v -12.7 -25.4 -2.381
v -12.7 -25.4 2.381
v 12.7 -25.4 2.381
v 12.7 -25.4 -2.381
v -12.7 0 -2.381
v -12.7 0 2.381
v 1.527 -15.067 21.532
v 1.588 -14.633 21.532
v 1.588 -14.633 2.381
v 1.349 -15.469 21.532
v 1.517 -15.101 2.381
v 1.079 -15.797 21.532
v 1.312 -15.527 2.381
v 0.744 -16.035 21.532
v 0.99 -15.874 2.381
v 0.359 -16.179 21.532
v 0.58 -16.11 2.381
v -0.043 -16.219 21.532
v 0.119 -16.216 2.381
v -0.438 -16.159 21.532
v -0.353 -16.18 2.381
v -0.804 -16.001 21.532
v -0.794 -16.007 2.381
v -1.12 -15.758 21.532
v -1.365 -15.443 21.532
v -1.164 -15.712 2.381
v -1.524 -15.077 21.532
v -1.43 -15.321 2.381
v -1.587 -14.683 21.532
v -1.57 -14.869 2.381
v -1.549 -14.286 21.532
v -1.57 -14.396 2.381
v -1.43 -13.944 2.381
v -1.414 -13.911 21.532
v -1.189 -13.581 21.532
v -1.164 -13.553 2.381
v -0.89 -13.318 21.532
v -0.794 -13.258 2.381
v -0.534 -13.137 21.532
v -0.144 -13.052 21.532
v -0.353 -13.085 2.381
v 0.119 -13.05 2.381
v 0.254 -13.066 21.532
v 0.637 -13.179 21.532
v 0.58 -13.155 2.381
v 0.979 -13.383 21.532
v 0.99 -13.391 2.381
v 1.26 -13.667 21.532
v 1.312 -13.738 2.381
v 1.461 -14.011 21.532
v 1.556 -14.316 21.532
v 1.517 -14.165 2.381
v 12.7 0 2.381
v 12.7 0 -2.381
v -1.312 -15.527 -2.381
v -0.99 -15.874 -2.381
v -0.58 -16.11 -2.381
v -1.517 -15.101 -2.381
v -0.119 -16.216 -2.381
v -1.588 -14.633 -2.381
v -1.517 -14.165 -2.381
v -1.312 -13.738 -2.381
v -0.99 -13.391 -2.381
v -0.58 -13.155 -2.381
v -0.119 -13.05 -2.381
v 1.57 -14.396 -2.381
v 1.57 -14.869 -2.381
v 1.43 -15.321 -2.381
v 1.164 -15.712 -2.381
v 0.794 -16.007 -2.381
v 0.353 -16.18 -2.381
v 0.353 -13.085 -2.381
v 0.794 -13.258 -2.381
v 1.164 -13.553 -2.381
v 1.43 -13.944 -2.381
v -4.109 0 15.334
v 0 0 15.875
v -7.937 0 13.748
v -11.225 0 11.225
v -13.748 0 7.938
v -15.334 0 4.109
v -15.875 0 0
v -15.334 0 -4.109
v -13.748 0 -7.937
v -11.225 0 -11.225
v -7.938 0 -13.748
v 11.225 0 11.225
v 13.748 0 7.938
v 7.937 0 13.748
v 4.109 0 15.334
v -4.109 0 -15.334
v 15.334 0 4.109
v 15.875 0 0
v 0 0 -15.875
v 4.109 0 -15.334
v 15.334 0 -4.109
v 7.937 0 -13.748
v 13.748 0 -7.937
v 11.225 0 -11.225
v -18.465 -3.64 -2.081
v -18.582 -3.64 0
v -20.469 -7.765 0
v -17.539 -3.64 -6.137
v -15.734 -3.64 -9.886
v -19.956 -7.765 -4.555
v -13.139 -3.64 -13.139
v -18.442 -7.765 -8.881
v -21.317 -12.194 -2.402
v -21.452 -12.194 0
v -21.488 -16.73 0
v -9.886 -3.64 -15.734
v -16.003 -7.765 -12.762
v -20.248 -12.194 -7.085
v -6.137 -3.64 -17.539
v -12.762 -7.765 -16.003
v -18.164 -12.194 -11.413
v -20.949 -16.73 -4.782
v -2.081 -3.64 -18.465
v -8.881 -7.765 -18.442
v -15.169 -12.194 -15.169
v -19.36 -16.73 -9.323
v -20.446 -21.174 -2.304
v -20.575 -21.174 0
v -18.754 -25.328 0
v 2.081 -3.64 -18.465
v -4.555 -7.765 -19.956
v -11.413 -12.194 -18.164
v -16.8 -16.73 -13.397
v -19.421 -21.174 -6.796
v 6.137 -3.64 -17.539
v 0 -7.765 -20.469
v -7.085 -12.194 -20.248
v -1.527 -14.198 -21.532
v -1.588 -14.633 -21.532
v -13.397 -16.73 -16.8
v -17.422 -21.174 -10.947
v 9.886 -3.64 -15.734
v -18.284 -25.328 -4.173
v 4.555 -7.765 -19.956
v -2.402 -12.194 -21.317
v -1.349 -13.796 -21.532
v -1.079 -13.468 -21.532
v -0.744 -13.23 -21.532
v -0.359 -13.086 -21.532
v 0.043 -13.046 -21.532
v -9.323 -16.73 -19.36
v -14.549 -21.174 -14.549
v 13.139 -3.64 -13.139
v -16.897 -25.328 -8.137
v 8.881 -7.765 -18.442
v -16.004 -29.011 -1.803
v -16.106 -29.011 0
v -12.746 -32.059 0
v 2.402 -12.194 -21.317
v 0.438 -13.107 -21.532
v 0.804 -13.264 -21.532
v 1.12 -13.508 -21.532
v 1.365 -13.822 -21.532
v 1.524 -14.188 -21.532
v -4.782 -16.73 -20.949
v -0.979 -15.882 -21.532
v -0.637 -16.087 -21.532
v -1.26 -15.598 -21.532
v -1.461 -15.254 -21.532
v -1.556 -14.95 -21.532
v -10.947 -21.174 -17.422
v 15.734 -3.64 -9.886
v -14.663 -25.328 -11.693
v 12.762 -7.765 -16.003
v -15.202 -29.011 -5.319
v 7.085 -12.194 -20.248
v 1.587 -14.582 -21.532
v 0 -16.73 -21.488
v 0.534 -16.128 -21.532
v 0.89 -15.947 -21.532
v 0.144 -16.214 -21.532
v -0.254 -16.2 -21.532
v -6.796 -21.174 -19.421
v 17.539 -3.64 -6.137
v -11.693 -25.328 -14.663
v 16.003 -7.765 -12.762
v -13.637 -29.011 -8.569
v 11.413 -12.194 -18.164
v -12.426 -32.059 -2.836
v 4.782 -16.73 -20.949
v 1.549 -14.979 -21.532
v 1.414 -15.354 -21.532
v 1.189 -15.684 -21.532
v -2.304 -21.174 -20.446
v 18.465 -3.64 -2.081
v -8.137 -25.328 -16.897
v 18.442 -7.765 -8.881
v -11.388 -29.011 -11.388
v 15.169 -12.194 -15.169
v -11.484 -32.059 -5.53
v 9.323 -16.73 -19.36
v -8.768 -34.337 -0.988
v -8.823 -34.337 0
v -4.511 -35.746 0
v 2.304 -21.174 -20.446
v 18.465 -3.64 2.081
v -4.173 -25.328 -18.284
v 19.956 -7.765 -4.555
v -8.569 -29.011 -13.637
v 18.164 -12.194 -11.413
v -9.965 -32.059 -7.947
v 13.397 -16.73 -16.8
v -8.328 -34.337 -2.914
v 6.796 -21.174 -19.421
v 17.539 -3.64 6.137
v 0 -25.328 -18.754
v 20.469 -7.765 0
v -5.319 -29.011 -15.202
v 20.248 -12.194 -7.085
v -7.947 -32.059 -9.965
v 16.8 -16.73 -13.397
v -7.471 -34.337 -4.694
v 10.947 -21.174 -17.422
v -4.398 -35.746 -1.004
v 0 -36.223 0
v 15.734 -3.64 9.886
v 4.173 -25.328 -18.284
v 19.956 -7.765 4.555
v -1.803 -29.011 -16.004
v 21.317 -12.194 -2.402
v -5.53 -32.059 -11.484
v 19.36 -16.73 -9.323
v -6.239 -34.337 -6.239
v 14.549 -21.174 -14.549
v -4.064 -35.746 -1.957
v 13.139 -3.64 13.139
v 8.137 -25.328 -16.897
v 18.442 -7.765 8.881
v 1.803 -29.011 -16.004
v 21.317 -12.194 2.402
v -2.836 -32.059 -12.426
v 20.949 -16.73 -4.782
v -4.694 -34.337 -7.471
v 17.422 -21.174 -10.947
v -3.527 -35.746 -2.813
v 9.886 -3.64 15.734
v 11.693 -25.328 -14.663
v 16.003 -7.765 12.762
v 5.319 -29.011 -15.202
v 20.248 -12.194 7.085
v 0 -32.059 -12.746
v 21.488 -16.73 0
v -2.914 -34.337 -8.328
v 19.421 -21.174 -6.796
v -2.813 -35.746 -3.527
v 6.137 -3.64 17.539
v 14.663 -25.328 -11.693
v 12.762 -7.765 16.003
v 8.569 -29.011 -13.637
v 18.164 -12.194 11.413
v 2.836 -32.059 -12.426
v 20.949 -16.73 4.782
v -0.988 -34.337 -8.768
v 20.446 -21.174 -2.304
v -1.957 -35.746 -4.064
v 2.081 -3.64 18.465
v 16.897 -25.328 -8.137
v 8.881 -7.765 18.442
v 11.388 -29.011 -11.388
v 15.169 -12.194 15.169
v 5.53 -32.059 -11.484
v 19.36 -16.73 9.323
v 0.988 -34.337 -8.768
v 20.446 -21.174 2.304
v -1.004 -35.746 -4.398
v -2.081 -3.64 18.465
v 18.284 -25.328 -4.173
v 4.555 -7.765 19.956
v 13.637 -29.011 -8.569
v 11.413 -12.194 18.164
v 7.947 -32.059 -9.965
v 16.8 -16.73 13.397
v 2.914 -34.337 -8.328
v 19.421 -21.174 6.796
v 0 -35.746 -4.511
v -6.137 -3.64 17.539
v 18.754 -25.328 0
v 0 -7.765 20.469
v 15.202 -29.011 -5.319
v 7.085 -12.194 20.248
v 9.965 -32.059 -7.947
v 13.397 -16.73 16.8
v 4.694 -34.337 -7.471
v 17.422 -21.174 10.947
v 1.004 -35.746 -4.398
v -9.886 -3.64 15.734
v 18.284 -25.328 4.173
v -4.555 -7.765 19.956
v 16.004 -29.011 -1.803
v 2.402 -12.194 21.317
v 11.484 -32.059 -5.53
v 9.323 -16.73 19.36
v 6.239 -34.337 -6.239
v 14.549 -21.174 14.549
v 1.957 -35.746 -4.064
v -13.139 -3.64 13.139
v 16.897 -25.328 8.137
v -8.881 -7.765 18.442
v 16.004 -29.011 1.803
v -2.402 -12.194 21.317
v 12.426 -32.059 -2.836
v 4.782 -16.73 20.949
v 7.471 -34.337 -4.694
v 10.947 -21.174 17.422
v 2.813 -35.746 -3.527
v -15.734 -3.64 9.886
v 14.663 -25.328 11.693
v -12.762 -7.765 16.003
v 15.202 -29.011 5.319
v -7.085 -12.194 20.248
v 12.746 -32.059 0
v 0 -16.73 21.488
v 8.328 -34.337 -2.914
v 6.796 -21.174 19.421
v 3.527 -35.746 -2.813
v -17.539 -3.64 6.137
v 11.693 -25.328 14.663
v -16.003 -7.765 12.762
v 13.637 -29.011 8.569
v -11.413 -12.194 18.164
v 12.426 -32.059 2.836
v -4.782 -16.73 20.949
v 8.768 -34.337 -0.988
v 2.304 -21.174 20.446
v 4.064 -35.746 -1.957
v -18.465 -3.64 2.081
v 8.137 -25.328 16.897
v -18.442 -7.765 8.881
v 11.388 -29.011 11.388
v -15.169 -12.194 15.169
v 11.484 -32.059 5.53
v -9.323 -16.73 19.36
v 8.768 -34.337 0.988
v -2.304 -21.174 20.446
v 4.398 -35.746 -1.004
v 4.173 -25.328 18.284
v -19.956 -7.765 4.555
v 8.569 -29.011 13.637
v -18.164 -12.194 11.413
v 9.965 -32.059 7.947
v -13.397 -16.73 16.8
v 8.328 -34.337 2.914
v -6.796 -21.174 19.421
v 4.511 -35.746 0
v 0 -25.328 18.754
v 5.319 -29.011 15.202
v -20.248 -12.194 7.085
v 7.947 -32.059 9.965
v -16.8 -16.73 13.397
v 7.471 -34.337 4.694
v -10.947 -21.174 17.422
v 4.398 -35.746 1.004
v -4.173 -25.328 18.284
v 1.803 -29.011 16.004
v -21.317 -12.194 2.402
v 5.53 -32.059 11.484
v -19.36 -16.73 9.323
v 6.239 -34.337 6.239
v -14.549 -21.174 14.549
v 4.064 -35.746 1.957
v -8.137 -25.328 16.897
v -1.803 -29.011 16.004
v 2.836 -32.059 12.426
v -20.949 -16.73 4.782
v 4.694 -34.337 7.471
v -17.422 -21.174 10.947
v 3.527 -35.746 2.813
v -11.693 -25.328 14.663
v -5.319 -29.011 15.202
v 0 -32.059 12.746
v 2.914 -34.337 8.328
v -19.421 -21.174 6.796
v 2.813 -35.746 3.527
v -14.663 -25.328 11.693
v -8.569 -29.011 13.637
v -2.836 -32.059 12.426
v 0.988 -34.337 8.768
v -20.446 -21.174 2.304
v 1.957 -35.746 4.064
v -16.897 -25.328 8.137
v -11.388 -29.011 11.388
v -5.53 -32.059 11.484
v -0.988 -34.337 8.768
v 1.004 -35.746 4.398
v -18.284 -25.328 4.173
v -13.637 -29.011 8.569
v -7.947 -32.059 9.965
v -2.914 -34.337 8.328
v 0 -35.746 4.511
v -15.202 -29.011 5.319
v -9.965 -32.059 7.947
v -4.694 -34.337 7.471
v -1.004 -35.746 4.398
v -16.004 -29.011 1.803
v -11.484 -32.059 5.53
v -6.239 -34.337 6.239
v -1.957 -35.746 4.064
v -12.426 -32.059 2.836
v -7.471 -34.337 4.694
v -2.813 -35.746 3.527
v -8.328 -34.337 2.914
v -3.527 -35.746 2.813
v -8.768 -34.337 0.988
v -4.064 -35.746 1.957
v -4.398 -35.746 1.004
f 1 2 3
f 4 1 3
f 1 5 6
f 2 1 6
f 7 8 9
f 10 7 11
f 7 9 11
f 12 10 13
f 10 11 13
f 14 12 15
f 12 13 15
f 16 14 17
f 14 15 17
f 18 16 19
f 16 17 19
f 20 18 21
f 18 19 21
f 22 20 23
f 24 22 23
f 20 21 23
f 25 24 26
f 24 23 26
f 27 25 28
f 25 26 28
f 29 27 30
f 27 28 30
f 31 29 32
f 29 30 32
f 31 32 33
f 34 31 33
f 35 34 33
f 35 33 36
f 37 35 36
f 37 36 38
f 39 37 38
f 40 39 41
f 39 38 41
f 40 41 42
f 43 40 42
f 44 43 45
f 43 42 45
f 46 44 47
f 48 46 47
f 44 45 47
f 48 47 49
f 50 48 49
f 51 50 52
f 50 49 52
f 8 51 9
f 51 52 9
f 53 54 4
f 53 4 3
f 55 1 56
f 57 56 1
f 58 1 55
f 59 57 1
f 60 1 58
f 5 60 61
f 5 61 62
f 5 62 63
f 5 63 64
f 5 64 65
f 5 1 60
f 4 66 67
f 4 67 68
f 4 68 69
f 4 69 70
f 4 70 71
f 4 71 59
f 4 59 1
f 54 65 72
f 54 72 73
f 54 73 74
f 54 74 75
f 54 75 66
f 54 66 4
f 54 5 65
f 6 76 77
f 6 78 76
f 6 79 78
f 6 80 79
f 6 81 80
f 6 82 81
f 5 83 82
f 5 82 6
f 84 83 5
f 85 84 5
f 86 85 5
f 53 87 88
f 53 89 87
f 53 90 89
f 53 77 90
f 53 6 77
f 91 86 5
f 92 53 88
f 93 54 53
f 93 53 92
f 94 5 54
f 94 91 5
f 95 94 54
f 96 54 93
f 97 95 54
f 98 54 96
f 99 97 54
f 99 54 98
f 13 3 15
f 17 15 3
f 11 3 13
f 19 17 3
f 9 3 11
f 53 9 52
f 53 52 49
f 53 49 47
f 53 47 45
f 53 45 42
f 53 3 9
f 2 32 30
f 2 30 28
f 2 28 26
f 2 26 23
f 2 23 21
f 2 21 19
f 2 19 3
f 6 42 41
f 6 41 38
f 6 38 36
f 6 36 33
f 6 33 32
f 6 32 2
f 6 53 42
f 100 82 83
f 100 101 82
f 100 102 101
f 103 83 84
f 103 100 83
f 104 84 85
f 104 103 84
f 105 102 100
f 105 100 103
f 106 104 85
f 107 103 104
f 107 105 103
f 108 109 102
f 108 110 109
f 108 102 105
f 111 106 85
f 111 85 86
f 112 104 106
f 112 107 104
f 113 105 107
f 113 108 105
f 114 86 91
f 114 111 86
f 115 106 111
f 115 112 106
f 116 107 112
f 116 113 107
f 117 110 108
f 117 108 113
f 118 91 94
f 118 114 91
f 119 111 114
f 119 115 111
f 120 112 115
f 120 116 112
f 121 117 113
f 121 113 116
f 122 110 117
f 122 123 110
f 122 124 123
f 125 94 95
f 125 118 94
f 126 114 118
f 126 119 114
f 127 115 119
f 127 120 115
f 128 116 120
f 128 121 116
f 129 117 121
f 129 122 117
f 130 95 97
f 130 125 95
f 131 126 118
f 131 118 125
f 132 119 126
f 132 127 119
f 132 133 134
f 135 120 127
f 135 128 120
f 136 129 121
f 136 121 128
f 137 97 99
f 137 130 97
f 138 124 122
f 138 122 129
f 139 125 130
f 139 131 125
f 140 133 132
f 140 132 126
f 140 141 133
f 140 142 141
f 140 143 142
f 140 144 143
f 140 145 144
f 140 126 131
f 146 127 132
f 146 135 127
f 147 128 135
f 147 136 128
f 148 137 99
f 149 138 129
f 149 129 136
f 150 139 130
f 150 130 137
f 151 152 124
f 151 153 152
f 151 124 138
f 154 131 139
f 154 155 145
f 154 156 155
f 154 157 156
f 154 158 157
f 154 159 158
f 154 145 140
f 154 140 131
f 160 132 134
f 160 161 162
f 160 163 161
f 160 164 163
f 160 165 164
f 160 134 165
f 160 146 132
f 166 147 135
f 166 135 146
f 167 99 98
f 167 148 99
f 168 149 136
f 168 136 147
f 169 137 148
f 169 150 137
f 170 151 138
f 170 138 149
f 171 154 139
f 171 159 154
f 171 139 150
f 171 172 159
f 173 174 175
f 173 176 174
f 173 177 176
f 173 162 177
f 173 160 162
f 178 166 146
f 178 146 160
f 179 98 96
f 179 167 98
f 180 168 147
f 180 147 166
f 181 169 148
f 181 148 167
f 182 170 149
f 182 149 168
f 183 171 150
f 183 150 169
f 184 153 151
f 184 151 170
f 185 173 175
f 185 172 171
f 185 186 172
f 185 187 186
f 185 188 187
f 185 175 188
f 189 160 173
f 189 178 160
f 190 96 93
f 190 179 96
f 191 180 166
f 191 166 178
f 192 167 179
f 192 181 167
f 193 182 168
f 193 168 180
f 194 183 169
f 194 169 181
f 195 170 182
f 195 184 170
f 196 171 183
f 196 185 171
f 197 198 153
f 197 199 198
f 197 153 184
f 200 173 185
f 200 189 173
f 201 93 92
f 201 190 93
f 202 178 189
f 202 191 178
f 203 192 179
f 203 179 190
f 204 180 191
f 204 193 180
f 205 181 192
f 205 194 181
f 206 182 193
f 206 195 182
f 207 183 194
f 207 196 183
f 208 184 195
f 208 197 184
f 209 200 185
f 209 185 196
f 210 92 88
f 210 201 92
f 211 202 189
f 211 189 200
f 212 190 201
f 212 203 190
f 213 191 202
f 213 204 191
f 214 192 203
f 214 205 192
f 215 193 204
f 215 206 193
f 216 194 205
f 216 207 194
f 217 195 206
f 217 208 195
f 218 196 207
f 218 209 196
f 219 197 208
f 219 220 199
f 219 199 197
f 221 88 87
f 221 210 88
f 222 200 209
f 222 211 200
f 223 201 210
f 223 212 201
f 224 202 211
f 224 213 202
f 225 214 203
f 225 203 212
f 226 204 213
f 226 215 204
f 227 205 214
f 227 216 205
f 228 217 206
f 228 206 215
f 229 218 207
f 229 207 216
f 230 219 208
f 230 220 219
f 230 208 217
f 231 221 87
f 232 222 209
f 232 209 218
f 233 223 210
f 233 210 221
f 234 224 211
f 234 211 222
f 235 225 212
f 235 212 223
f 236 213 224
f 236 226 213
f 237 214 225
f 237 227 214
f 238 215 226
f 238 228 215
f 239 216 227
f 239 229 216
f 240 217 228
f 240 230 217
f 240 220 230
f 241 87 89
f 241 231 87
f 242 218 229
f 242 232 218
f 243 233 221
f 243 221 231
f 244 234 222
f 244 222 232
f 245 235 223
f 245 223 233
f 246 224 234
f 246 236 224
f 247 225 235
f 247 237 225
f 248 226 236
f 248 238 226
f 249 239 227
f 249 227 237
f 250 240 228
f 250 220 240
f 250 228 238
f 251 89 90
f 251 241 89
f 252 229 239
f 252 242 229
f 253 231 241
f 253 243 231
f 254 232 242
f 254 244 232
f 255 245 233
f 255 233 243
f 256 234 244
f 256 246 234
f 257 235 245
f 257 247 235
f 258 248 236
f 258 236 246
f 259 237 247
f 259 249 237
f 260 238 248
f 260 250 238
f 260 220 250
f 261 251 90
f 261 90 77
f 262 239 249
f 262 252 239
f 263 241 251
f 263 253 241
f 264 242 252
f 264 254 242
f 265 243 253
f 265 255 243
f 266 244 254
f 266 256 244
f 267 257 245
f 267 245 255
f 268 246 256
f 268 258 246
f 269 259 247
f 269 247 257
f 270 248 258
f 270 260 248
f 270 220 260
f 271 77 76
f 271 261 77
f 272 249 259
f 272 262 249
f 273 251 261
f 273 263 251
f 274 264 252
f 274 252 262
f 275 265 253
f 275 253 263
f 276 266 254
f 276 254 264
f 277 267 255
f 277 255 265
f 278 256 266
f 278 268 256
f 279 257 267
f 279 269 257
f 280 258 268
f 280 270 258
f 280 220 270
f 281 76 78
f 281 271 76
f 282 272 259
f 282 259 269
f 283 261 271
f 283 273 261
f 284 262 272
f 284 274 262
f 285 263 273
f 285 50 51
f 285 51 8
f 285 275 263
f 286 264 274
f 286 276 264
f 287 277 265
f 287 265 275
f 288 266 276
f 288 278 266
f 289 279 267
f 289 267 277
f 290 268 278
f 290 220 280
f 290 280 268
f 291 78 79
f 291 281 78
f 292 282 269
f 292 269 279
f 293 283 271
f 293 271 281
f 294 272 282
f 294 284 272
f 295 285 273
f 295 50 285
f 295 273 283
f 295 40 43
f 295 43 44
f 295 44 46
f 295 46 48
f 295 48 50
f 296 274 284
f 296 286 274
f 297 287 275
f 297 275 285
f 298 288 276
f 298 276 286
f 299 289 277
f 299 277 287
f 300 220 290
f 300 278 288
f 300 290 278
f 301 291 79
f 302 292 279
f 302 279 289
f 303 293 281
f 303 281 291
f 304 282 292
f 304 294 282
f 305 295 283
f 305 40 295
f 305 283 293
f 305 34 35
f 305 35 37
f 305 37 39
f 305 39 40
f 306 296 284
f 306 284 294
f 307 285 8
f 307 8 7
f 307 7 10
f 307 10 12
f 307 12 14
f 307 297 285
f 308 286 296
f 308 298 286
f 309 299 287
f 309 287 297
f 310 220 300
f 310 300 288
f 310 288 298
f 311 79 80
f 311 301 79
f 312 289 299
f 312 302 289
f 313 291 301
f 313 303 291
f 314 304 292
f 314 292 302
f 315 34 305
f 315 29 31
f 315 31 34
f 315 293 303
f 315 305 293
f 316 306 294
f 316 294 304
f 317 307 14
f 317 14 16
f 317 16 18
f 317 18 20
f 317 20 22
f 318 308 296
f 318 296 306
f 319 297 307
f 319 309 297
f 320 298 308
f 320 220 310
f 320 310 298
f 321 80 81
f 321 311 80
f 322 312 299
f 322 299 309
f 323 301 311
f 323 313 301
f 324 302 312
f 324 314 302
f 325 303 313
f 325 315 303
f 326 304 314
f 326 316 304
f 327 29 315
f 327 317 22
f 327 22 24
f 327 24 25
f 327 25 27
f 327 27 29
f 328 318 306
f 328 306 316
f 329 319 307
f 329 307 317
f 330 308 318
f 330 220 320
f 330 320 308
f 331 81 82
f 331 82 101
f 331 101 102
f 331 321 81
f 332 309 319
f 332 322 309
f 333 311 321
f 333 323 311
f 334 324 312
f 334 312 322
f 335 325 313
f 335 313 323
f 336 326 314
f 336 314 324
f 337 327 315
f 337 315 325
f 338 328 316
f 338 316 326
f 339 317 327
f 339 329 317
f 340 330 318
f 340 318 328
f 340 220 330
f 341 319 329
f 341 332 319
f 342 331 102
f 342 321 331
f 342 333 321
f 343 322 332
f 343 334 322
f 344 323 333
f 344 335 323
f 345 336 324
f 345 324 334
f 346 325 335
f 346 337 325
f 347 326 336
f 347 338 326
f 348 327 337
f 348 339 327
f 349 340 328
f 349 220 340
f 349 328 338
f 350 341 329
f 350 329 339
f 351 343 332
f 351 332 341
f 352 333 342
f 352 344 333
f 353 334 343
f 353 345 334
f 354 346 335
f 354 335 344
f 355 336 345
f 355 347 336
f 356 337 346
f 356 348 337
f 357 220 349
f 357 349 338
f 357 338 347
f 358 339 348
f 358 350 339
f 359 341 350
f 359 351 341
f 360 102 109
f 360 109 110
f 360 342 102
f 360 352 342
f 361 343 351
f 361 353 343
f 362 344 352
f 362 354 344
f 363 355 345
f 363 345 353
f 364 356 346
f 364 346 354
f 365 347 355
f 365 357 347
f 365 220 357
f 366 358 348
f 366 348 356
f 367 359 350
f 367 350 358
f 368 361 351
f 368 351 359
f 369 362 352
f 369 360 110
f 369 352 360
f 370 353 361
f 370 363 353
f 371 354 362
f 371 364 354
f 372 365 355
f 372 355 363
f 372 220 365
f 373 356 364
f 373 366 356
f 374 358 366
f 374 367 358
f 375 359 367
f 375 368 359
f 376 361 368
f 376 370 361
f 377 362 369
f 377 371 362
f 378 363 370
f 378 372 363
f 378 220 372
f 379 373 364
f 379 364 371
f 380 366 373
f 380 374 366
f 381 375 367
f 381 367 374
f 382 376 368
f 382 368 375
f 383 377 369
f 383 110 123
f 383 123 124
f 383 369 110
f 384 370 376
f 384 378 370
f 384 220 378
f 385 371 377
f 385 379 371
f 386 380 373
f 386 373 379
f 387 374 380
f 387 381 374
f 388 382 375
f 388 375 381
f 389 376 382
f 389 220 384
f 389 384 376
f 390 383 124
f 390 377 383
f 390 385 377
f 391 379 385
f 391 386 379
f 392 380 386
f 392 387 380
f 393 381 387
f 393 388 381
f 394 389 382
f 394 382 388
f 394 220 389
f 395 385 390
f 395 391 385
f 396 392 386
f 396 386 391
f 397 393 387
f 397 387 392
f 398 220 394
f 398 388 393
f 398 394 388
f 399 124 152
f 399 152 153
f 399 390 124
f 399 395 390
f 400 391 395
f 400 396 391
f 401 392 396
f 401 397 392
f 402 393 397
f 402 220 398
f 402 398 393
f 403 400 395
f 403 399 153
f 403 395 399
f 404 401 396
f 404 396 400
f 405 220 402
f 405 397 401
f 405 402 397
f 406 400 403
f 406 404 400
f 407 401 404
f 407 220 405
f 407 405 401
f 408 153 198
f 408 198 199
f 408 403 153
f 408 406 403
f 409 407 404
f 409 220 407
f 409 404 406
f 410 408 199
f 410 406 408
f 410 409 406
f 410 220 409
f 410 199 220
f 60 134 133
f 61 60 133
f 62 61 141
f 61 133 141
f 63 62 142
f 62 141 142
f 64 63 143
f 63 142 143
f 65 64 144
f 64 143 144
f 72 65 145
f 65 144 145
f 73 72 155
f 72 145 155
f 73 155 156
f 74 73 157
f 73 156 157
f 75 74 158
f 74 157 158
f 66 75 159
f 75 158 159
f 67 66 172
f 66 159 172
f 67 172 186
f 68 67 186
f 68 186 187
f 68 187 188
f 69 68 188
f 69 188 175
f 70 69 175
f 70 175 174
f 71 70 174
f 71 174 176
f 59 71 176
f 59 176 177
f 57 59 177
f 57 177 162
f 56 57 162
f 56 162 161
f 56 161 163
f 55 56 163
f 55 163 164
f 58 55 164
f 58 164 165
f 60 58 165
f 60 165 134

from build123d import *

# Parameters (mm, degrees)
F0_W     = 12.7
F0_H     = 4.7625
F1_DEPTH = 25.4
F2_D     = 3.175
F2_DEPTH = 21.591
F5_D     = 3.175


with BuildPart() as f4:
    # F3 (on Top) → F4 (revolve)
    with BuildSketch(Plane.XY):
        with BuildLine():
            Line((0, -36.2225826497), (0, 0))
            Line((0, 0), (-15.875, 0))
            ThreePointArc((-15.875, 0), (-19.7742959345, -23.2989152245), (0, -36.2225826497))
        make_face()
    revolve(axis=Axis((0, -18.1112913248, 0), (0, -1, 0)))

    # F0 (on Front) → F1 (cut)
    with BuildSketch(Plane.XZ):
        with Locations((6.35, 0)):
            Rectangle(F0_W, F0_H)
        with Locations((-6.35, 0)):
            Rectangle(F0_W, F0_H)
    extrude(amount=F1_DEPTH, mode=Mode.SUBTRACT)

    # F2 (through all, one way)
    with BuildSketch(Plane(origin=(0, 0, 0), x_dir=(1, 0, 0), z_dir=(0, 0, -1))):
        with Locations((0, 14.6325826497)):
            Circle(F2_D / 2)
    extrude(amount=-F2_DEPTH, mode=Mode.SUBTRACT)

    # F5 (through all)
    with Locations(Plane.XY):
        with Locations((0, -14.6325826497)):
            Hole(F5_D / 2)


solid = f4.part
